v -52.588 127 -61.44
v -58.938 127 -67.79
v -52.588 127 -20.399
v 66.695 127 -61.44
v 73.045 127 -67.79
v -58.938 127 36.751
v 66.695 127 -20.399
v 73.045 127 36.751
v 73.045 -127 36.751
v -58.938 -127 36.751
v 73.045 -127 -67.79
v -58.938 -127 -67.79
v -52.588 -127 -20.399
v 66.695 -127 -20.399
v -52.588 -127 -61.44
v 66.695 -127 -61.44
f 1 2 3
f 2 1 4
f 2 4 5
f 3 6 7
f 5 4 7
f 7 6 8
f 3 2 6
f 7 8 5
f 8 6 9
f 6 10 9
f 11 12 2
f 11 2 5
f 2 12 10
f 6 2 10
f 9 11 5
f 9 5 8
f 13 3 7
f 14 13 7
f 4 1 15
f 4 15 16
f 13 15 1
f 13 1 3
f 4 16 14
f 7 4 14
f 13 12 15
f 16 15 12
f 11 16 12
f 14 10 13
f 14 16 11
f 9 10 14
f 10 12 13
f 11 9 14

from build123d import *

# Parameters (mm, degrees)
F0_W     = 131.982717663
F0_H     = 104.5415252447
F0_W_2   = 119.2827182055
F0_H_2   = 91.8415257871
F1_DEPTH = 127
F2_DEPTH = 50.8


with BuildPart() as f1:
    # F0 (on Front) → F1 (new body, symmetric)
    with BuildSketch(Plane.XZ):
        with Locations((7.0537086576, -15.5196636915)):
            Rectangle(F0_W, F0_H)
        with Locations((7.0537083864, -15.5196639627)):
            Rectangle(F0_W_2, F0_H_2, mode=Mode.SUBTRACT)
    extrude(amount=F1_DEPTH, both=True)

    # F2 (add): a face of the model
    f2_faces = [f1.faces().sort_by_distance(p)[0] for p in [
        (7.0537083864, 0, 30.4010989308),
    ]]
    extrude(f2_faces, amount=F2_DEPTH)


solid = f1.part
